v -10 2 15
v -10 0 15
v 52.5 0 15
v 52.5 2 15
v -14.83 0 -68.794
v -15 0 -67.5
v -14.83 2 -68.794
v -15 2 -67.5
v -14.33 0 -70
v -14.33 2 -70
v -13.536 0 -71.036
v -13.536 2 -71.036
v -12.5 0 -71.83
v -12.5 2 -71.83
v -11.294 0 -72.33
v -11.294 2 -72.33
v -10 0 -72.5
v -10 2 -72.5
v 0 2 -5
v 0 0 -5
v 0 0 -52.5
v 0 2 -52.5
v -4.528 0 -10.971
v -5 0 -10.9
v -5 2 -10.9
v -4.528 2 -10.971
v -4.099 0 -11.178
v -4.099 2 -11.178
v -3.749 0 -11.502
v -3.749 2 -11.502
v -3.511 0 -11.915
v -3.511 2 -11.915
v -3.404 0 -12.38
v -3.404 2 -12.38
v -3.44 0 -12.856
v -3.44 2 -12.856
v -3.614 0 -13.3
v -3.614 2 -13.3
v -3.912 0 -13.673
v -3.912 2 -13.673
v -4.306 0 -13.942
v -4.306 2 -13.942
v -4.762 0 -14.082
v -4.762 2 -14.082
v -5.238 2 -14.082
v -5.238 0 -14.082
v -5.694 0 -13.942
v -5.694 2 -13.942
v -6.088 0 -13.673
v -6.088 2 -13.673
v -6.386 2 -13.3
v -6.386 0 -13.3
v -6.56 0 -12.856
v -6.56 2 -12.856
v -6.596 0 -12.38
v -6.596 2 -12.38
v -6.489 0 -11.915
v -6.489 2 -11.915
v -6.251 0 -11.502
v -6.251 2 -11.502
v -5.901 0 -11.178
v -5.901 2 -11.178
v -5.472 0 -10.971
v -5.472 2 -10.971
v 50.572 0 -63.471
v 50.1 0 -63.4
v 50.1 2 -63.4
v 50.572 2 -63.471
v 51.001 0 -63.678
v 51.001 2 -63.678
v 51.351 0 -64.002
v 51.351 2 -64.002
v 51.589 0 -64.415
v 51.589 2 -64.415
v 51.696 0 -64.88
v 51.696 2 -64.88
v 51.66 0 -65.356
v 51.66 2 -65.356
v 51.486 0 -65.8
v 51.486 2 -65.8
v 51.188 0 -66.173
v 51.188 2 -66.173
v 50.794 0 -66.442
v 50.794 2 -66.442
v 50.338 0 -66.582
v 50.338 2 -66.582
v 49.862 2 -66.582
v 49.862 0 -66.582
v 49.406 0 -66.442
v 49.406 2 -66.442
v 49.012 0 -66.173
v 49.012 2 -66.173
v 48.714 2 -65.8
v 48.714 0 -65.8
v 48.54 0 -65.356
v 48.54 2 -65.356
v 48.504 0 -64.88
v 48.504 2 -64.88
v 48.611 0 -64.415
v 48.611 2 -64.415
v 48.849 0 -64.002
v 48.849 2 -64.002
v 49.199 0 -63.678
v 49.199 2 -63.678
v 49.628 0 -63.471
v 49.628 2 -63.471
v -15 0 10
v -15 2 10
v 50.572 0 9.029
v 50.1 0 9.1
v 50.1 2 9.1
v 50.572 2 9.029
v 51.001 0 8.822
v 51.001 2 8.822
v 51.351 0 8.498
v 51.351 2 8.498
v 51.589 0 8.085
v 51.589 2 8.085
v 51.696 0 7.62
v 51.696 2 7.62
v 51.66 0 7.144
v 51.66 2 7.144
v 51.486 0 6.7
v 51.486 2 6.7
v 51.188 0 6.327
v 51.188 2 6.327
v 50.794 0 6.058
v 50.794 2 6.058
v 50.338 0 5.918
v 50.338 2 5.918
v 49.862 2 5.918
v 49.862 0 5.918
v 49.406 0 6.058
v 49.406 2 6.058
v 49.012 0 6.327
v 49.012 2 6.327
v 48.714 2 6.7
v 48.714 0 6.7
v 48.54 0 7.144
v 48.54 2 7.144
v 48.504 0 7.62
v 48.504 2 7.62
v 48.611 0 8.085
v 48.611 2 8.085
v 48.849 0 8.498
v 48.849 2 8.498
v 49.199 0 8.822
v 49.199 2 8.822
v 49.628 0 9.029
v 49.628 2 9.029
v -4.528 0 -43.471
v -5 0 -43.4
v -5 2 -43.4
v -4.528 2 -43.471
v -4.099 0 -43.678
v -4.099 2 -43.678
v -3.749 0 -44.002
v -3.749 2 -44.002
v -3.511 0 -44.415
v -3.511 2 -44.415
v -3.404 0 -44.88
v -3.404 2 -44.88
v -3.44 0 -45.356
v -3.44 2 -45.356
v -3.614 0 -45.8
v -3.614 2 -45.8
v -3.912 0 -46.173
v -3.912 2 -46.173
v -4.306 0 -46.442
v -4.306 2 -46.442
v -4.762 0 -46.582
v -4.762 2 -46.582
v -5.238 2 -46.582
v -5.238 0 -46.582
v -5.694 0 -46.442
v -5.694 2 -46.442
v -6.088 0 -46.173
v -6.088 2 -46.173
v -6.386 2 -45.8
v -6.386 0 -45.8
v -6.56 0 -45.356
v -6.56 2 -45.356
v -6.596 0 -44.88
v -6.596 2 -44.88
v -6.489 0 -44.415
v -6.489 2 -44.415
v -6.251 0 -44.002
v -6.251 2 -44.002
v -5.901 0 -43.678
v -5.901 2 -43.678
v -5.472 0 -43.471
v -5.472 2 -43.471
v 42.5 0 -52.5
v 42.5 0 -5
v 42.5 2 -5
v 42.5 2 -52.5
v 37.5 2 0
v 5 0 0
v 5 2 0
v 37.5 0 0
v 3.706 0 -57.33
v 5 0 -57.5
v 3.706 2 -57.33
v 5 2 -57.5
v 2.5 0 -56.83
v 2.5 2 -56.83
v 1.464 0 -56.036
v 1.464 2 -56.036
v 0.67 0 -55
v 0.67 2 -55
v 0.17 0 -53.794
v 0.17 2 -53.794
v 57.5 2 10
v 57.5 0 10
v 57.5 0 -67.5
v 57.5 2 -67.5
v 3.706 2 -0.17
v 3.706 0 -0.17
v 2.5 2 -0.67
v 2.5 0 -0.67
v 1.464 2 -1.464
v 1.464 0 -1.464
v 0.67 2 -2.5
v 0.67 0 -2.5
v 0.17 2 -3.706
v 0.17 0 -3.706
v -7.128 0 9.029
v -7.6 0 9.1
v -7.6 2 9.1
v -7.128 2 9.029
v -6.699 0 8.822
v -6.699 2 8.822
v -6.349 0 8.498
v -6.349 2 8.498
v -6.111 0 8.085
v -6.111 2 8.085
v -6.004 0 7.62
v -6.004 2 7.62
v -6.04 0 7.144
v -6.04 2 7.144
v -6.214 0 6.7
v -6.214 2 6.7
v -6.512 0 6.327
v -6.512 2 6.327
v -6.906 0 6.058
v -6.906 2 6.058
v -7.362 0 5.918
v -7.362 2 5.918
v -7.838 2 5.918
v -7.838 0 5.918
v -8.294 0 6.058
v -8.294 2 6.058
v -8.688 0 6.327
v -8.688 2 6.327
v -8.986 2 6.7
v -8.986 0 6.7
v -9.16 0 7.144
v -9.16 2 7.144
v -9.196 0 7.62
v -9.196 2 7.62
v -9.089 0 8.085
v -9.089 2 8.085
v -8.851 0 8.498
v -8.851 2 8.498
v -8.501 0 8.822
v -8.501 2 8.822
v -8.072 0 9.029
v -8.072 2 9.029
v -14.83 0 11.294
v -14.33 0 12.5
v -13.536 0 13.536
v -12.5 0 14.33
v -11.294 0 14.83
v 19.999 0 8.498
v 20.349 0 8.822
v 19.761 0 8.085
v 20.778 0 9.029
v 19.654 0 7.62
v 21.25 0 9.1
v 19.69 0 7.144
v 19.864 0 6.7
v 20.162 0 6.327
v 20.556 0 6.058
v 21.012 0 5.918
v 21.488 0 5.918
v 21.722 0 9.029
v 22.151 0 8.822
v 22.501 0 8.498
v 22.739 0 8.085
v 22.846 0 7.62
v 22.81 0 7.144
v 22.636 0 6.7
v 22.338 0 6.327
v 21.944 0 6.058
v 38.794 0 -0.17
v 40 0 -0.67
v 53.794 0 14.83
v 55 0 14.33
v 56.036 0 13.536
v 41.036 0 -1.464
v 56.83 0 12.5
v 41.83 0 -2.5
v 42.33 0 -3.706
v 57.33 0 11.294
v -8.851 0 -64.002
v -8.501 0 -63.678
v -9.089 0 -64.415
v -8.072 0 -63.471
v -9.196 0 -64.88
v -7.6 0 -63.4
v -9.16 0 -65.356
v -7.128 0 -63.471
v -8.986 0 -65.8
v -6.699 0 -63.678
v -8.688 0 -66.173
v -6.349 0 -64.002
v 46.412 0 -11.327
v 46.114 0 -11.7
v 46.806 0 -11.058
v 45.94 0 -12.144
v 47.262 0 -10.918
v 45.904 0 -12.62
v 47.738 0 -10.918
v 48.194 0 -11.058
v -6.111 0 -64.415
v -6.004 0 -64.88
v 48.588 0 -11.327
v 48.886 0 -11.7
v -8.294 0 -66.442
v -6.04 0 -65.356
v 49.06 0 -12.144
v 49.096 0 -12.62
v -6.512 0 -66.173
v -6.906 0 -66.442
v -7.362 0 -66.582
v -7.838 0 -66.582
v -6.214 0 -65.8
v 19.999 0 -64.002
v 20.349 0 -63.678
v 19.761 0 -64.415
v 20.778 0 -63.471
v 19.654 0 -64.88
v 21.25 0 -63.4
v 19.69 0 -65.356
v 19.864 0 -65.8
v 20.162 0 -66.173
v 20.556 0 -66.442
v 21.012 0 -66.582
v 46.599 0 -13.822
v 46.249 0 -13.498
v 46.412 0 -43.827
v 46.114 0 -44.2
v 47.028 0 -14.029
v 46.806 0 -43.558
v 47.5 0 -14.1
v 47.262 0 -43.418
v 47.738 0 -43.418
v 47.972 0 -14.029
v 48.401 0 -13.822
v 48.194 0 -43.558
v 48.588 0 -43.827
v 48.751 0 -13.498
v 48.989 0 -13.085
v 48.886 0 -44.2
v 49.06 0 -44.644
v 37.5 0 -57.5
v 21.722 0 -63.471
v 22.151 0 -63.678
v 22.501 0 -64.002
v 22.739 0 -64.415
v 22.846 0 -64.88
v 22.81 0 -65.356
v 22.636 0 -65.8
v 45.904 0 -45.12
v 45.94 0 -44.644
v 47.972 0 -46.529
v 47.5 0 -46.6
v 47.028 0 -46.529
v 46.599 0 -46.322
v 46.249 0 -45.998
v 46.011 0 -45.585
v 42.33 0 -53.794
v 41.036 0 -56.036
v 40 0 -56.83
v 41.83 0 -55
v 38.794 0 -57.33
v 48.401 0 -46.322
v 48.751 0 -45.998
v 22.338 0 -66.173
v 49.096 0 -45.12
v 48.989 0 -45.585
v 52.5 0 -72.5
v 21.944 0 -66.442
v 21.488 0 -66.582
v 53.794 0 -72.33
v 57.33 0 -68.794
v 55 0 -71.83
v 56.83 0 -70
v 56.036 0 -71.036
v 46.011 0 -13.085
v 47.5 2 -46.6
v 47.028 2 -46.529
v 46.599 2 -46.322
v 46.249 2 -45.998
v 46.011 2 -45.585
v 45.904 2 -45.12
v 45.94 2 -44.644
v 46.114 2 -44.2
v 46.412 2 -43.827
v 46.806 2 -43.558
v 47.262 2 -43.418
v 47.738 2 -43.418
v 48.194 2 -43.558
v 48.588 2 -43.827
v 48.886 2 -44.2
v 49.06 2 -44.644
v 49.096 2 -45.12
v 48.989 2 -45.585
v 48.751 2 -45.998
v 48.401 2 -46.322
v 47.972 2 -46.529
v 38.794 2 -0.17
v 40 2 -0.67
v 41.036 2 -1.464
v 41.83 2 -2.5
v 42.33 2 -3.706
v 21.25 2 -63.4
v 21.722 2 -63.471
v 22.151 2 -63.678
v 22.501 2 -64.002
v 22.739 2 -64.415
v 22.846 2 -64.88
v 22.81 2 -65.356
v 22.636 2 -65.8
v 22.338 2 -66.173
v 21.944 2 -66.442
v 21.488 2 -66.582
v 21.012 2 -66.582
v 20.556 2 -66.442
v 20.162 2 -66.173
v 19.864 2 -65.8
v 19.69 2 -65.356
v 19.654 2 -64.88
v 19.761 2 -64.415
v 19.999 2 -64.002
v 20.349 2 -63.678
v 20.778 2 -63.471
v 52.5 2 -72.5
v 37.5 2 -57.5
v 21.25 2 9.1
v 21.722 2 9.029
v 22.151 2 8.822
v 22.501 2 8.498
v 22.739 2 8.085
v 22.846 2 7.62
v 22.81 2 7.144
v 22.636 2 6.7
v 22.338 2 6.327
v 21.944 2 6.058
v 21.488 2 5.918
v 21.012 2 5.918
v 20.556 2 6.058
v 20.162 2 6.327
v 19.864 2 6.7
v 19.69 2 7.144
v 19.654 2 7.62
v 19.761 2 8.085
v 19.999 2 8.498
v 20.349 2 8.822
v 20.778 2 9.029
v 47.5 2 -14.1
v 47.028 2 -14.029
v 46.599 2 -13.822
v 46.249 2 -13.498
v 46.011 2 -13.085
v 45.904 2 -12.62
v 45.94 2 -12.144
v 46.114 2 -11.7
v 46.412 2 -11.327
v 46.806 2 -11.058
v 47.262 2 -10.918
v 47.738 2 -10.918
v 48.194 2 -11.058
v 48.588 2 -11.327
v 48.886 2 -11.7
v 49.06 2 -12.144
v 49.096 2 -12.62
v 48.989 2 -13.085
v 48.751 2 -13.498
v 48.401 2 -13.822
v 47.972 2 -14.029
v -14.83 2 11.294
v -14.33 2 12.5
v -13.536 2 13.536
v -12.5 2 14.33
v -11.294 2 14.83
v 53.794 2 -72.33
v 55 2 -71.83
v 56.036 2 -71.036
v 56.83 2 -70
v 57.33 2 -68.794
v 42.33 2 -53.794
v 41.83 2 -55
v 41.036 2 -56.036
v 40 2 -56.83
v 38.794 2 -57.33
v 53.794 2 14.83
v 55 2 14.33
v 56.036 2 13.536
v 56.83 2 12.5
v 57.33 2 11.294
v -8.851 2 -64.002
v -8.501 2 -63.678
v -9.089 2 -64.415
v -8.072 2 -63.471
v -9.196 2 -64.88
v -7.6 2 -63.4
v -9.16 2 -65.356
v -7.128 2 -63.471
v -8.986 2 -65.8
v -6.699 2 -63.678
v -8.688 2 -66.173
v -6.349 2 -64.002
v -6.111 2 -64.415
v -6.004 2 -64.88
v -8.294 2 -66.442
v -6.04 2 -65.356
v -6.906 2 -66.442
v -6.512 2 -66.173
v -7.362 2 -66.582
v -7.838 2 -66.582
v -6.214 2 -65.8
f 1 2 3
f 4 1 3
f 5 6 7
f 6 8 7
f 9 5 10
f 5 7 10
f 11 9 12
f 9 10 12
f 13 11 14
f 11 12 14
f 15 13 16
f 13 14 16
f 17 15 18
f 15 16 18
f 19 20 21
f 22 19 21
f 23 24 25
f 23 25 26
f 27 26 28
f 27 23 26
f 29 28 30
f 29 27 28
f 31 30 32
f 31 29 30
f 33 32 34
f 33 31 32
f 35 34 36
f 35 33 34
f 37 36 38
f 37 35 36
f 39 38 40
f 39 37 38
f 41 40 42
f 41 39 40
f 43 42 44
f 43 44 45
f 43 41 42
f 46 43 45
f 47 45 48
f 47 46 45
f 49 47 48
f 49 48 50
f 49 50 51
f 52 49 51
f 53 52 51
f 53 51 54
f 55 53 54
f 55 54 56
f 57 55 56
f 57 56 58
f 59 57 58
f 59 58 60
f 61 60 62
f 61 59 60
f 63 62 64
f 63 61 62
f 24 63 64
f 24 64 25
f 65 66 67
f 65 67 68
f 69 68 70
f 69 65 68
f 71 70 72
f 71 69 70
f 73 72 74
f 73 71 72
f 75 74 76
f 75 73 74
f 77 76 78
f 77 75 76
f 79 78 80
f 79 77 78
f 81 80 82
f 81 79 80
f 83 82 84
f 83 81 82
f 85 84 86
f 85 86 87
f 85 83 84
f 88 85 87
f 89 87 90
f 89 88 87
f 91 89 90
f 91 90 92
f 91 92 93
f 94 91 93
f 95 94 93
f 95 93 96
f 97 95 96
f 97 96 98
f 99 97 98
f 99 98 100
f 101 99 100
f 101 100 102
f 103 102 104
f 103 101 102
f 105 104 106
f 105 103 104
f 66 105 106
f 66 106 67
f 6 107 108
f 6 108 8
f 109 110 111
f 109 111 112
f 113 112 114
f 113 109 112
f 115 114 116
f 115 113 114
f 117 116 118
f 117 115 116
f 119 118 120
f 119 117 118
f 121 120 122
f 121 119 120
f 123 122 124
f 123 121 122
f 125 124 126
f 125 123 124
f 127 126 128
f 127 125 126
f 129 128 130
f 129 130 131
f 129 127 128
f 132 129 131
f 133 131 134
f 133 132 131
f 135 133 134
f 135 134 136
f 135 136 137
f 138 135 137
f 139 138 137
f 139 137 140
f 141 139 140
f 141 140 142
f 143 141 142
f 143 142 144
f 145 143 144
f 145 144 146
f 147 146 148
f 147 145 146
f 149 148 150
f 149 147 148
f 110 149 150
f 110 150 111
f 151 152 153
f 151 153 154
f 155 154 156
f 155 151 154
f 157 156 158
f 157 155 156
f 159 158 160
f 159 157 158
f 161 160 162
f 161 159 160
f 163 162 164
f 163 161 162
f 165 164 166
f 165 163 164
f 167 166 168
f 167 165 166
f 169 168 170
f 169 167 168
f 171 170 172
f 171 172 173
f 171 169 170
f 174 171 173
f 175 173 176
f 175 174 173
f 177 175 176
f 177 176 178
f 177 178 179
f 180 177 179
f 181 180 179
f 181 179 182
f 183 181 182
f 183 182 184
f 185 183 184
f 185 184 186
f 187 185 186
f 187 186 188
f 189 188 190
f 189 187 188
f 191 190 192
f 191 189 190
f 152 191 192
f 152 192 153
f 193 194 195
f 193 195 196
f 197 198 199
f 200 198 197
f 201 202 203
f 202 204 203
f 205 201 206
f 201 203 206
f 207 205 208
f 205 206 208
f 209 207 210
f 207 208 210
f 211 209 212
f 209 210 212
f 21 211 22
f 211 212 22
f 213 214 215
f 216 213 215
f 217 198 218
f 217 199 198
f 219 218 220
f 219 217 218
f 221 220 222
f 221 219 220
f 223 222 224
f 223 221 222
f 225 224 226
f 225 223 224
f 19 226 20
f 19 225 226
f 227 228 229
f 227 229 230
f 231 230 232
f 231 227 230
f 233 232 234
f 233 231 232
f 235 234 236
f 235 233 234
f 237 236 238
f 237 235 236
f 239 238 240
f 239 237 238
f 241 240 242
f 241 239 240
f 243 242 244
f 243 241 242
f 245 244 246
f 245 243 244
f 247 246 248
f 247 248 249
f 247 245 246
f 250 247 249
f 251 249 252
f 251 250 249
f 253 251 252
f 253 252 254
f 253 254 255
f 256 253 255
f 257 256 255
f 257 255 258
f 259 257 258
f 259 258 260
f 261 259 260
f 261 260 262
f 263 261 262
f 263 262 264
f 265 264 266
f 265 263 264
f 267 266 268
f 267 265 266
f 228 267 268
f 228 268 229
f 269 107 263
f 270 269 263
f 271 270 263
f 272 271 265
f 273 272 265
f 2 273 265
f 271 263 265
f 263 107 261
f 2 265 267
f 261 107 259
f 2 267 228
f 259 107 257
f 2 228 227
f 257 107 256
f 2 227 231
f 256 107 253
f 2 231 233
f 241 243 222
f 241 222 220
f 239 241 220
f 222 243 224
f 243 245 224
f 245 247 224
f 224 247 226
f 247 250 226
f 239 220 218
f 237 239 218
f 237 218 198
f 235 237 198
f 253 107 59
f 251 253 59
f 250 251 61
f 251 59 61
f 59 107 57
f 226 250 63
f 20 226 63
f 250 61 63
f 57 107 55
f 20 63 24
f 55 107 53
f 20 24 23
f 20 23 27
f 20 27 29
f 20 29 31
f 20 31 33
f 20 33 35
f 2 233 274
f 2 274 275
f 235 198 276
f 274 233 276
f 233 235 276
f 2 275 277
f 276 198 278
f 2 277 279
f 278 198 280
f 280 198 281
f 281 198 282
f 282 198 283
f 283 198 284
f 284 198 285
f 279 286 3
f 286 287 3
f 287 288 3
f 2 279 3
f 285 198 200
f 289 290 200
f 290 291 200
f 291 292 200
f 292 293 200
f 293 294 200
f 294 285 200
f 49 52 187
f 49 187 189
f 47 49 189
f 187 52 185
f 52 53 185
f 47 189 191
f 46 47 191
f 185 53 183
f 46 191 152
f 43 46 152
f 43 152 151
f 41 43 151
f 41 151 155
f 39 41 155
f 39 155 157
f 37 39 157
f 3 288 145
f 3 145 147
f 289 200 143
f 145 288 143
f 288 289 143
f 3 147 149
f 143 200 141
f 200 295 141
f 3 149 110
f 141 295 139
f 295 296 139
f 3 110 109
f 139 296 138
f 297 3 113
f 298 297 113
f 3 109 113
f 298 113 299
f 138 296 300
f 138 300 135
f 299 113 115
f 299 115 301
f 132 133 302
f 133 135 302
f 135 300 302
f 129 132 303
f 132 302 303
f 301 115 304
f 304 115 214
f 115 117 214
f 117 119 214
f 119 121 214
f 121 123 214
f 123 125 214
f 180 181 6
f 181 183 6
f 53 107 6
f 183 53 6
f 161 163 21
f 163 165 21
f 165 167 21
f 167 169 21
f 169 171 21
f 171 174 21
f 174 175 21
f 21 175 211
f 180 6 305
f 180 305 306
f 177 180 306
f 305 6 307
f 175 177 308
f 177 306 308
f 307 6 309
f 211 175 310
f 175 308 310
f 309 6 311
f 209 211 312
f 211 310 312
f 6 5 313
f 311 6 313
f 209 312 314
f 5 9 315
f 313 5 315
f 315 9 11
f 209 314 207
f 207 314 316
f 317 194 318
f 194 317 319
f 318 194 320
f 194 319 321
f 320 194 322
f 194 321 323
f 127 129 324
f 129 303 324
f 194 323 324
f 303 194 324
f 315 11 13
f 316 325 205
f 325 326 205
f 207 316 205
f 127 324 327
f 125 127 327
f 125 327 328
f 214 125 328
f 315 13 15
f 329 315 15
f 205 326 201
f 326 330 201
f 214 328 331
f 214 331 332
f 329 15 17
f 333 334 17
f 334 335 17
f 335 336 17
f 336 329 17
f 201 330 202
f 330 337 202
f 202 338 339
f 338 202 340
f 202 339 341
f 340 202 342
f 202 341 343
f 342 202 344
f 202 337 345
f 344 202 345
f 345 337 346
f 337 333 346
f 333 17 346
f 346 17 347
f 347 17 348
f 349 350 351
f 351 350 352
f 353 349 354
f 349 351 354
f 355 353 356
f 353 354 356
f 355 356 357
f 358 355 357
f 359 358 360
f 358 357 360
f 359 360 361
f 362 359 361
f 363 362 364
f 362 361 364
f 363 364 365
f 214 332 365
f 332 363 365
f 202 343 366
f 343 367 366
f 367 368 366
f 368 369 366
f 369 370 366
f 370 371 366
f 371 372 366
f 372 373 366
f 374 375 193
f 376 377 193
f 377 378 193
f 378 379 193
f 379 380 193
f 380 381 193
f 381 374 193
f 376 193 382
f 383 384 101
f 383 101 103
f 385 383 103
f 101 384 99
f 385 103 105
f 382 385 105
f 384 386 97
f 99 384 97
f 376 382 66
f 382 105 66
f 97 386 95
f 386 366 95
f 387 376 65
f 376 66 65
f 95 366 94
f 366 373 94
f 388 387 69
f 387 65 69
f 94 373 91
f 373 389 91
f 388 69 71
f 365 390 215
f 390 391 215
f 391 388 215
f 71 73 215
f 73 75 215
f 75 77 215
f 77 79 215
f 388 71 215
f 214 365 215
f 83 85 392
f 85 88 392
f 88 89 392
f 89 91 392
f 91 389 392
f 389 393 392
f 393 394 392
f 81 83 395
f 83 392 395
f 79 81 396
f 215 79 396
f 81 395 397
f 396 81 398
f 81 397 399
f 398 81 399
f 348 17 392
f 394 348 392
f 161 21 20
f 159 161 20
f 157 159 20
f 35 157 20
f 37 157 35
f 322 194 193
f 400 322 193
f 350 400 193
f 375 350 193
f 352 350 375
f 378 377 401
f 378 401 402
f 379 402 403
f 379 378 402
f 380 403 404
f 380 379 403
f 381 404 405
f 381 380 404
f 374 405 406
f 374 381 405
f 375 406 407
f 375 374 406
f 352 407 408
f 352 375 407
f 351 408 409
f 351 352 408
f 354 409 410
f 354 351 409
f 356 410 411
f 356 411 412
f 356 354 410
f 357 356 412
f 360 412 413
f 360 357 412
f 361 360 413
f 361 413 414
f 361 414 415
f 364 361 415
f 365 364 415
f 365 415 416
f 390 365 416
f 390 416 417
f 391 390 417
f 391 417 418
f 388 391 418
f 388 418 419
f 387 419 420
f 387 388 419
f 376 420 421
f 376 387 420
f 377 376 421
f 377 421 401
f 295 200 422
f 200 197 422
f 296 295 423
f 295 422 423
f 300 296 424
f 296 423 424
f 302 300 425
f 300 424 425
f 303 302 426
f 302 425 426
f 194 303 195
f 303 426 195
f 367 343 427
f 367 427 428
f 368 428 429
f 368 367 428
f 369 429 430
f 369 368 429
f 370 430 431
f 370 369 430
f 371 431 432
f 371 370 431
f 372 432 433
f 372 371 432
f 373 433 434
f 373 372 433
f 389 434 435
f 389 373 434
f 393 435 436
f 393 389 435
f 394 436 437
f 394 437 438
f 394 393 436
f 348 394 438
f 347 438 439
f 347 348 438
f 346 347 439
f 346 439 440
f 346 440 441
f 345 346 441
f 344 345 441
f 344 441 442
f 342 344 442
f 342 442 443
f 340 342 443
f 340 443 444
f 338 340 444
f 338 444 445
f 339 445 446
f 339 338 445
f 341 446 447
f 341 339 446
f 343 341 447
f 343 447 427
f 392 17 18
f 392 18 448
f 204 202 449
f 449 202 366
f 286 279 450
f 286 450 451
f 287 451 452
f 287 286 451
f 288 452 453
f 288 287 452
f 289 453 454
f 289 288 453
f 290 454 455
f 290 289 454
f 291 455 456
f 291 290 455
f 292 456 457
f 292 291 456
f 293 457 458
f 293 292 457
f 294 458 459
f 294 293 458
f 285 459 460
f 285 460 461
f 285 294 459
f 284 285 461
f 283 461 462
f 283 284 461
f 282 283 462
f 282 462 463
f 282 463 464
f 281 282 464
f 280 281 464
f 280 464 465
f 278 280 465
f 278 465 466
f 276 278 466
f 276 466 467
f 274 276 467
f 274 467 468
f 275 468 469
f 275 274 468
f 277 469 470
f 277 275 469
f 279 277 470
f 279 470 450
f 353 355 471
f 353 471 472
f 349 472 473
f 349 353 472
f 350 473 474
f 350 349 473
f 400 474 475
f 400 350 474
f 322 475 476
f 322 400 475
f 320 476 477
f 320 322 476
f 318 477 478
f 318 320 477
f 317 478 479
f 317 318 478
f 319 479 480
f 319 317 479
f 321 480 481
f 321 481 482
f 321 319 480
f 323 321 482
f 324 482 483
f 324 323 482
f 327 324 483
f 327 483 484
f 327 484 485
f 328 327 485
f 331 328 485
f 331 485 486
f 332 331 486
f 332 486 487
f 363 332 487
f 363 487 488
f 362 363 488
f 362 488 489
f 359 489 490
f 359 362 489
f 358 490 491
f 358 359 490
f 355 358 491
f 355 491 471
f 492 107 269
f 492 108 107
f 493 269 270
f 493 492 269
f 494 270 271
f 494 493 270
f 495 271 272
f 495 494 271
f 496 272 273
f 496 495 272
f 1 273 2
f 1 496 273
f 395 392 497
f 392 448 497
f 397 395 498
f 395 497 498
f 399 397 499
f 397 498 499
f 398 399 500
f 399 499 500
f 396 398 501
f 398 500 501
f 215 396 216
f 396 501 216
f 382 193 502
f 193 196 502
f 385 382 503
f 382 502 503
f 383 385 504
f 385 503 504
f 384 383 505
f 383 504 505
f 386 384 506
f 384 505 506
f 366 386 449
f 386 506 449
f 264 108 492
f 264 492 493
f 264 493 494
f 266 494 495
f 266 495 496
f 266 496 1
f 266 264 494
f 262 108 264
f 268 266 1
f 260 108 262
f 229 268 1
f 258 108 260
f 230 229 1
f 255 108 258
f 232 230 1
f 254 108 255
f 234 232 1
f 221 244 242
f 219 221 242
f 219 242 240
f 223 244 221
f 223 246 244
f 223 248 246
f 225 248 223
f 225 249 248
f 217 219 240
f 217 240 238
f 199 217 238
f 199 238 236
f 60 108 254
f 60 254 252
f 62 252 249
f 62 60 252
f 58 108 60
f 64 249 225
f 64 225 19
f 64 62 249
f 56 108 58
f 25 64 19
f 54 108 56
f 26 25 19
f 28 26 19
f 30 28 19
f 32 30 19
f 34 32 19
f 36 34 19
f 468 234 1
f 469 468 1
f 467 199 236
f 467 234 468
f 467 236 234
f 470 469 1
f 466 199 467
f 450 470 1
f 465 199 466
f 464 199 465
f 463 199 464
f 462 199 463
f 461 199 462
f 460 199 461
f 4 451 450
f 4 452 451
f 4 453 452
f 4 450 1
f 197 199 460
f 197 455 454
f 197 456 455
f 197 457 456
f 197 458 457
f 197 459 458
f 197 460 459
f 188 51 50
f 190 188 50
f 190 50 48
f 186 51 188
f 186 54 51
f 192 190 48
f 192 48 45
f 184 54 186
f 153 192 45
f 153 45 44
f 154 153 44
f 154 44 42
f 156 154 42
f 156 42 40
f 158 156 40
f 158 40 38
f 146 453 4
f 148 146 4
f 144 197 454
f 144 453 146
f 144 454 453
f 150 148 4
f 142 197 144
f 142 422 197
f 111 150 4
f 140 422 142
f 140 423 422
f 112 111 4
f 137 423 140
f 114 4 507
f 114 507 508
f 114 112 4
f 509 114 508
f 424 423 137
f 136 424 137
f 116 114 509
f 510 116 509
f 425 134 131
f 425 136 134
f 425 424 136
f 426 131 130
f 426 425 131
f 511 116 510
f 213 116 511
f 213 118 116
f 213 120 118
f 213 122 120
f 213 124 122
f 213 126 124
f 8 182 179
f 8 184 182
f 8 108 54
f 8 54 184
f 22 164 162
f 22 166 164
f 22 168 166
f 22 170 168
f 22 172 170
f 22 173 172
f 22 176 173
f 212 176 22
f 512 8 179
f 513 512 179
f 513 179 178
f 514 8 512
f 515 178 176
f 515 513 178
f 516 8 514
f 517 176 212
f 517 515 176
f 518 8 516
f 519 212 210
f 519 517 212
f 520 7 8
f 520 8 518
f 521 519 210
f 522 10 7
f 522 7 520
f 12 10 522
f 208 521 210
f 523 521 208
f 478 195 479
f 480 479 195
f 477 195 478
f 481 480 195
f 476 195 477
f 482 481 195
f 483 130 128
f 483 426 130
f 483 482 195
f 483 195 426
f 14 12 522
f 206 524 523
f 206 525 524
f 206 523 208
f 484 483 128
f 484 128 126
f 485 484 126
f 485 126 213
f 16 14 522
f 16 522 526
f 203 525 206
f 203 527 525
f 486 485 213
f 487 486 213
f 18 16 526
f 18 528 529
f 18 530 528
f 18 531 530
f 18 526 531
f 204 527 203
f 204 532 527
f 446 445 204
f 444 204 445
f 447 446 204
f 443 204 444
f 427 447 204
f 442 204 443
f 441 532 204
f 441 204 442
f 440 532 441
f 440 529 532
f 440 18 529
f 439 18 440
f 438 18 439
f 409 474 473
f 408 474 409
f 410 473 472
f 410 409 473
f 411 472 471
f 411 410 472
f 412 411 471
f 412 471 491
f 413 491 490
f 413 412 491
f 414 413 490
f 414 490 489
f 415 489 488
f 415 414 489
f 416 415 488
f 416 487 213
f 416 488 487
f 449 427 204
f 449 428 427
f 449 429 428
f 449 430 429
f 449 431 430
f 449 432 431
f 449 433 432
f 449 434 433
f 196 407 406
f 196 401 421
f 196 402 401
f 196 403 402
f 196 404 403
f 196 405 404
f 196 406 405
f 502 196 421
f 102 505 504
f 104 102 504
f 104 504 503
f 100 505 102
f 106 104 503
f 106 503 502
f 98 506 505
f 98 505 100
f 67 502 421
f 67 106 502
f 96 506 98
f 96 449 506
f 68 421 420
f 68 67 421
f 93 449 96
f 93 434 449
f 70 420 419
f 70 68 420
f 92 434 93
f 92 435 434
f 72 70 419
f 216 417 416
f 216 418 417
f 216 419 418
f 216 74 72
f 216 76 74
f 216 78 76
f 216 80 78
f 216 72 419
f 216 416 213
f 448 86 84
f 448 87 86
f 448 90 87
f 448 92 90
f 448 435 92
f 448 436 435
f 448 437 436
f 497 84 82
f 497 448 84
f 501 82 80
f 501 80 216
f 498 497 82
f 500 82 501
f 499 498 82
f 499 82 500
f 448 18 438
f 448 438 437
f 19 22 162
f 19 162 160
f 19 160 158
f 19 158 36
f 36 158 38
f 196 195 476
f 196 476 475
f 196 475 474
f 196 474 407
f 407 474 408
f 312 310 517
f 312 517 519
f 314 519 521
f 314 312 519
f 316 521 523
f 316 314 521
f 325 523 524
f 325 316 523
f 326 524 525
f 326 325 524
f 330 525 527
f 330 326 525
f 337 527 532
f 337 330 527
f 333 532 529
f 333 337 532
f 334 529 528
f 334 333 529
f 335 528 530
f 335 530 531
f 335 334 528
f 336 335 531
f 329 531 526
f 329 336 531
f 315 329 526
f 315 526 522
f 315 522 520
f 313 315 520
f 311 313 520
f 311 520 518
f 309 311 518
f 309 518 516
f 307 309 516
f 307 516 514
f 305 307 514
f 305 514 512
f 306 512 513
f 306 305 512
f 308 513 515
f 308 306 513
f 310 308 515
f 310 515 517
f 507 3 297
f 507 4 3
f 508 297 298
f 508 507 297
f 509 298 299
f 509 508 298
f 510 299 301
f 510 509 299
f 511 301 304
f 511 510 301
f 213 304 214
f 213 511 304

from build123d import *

# Parameters (mm, degrees)
SKETCH_1_W      = 72.5
SKETCH_1_H      = 87.5
SKETCH_1_R      = 1.6
SKETCH_1_W_2    = 42.5
SKETCH_1_H_2    = 57.5
EXTRUDE_1_DEPTH = 2
FILLET_1_R      = 5


with BuildPart() as part:
    # 草图1 → 凸台-拉伸1 (new body)
    with BuildSketch(Plane(origin=(0, 0, 0), x_dir=(1, 0, 0), z_dir=(0, 1, 0))):
        with Locations((21.25, 28.75)):
            Rectangle(SKETCH_1_W, SKETCH_1_H)
        with Locations(Location((-7.6, 65, 0), (0, 0, 270))):
            Circle(SKETCH_1_R, mode=Mode.SUBTRACT)
        with Locations(Location((21.25, 65, 0), (0, 0, 270))):
            Circle(SKETCH_1_R, mode=Mode.SUBTRACT)
        with Locations(Location((50.1, 65, 0), (0, 0, 270))):
            Circle(SKETCH_1_R, mode=Mode.SUBTRACT)
        with Locations(Location((50.1, -7.5, 0), (0, 0, 270))):
            Circle(SKETCH_1_R, mode=Mode.SUBTRACT)
        with Locations(Location((21.25, -7.5, 0), (0, 0, 270))):
            Circle(SKETCH_1_R, mode=Mode.SUBTRACT)
        with Locations(Location((-7.6, -7.5, 0), (0, 0, 270))):
            Circle(SKETCH_1_R, mode=Mode.SUBTRACT)
        with Locations(Location((-5, 45, 0), (0, 0, 270))):
            Circle(SKETCH_1_R, mode=Mode.SUBTRACT)
        with Locations(Location((-5, 12.5, 0), (0, 0, 270))):
            Circle(SKETCH_1_R, mode=Mode.SUBTRACT)
        with Locations(Location((47.5, 12.5, 0), (0, 0, 90))):
            Circle(SKETCH_1_R, mode=Mode.SUBTRACT)
        with Locations(Location((47.5, 45, 0), (0, 0, 90))):
            Circle(SKETCH_1_R, mode=Mode.SUBTRACT)
        with Locations((21.25, 28.75)):
            Rectangle(SKETCH_1_W_2, SKETCH_1_H_2, mode=Mode.SUBTRACT)
    extrude(amount=EXTRUDE_1_DEPTH)

    # 圆角1
    fillet_1_edges = [part.edges().sort_by_distance(p)[0] for p in [
        (0, 1, -57.5),
        (0, 1, 0),
        (42.5, 1, 0),
        (42.5, 1, -57.5),
        (-15, 1, 15),
        (-15, 1, -72.5),
        (57.5, 1, -72.5),
        (57.5, 1, 15),
    ]]
    fillet(fillet_1_edges, radius=FILLET_1_R)


solid = part.part
